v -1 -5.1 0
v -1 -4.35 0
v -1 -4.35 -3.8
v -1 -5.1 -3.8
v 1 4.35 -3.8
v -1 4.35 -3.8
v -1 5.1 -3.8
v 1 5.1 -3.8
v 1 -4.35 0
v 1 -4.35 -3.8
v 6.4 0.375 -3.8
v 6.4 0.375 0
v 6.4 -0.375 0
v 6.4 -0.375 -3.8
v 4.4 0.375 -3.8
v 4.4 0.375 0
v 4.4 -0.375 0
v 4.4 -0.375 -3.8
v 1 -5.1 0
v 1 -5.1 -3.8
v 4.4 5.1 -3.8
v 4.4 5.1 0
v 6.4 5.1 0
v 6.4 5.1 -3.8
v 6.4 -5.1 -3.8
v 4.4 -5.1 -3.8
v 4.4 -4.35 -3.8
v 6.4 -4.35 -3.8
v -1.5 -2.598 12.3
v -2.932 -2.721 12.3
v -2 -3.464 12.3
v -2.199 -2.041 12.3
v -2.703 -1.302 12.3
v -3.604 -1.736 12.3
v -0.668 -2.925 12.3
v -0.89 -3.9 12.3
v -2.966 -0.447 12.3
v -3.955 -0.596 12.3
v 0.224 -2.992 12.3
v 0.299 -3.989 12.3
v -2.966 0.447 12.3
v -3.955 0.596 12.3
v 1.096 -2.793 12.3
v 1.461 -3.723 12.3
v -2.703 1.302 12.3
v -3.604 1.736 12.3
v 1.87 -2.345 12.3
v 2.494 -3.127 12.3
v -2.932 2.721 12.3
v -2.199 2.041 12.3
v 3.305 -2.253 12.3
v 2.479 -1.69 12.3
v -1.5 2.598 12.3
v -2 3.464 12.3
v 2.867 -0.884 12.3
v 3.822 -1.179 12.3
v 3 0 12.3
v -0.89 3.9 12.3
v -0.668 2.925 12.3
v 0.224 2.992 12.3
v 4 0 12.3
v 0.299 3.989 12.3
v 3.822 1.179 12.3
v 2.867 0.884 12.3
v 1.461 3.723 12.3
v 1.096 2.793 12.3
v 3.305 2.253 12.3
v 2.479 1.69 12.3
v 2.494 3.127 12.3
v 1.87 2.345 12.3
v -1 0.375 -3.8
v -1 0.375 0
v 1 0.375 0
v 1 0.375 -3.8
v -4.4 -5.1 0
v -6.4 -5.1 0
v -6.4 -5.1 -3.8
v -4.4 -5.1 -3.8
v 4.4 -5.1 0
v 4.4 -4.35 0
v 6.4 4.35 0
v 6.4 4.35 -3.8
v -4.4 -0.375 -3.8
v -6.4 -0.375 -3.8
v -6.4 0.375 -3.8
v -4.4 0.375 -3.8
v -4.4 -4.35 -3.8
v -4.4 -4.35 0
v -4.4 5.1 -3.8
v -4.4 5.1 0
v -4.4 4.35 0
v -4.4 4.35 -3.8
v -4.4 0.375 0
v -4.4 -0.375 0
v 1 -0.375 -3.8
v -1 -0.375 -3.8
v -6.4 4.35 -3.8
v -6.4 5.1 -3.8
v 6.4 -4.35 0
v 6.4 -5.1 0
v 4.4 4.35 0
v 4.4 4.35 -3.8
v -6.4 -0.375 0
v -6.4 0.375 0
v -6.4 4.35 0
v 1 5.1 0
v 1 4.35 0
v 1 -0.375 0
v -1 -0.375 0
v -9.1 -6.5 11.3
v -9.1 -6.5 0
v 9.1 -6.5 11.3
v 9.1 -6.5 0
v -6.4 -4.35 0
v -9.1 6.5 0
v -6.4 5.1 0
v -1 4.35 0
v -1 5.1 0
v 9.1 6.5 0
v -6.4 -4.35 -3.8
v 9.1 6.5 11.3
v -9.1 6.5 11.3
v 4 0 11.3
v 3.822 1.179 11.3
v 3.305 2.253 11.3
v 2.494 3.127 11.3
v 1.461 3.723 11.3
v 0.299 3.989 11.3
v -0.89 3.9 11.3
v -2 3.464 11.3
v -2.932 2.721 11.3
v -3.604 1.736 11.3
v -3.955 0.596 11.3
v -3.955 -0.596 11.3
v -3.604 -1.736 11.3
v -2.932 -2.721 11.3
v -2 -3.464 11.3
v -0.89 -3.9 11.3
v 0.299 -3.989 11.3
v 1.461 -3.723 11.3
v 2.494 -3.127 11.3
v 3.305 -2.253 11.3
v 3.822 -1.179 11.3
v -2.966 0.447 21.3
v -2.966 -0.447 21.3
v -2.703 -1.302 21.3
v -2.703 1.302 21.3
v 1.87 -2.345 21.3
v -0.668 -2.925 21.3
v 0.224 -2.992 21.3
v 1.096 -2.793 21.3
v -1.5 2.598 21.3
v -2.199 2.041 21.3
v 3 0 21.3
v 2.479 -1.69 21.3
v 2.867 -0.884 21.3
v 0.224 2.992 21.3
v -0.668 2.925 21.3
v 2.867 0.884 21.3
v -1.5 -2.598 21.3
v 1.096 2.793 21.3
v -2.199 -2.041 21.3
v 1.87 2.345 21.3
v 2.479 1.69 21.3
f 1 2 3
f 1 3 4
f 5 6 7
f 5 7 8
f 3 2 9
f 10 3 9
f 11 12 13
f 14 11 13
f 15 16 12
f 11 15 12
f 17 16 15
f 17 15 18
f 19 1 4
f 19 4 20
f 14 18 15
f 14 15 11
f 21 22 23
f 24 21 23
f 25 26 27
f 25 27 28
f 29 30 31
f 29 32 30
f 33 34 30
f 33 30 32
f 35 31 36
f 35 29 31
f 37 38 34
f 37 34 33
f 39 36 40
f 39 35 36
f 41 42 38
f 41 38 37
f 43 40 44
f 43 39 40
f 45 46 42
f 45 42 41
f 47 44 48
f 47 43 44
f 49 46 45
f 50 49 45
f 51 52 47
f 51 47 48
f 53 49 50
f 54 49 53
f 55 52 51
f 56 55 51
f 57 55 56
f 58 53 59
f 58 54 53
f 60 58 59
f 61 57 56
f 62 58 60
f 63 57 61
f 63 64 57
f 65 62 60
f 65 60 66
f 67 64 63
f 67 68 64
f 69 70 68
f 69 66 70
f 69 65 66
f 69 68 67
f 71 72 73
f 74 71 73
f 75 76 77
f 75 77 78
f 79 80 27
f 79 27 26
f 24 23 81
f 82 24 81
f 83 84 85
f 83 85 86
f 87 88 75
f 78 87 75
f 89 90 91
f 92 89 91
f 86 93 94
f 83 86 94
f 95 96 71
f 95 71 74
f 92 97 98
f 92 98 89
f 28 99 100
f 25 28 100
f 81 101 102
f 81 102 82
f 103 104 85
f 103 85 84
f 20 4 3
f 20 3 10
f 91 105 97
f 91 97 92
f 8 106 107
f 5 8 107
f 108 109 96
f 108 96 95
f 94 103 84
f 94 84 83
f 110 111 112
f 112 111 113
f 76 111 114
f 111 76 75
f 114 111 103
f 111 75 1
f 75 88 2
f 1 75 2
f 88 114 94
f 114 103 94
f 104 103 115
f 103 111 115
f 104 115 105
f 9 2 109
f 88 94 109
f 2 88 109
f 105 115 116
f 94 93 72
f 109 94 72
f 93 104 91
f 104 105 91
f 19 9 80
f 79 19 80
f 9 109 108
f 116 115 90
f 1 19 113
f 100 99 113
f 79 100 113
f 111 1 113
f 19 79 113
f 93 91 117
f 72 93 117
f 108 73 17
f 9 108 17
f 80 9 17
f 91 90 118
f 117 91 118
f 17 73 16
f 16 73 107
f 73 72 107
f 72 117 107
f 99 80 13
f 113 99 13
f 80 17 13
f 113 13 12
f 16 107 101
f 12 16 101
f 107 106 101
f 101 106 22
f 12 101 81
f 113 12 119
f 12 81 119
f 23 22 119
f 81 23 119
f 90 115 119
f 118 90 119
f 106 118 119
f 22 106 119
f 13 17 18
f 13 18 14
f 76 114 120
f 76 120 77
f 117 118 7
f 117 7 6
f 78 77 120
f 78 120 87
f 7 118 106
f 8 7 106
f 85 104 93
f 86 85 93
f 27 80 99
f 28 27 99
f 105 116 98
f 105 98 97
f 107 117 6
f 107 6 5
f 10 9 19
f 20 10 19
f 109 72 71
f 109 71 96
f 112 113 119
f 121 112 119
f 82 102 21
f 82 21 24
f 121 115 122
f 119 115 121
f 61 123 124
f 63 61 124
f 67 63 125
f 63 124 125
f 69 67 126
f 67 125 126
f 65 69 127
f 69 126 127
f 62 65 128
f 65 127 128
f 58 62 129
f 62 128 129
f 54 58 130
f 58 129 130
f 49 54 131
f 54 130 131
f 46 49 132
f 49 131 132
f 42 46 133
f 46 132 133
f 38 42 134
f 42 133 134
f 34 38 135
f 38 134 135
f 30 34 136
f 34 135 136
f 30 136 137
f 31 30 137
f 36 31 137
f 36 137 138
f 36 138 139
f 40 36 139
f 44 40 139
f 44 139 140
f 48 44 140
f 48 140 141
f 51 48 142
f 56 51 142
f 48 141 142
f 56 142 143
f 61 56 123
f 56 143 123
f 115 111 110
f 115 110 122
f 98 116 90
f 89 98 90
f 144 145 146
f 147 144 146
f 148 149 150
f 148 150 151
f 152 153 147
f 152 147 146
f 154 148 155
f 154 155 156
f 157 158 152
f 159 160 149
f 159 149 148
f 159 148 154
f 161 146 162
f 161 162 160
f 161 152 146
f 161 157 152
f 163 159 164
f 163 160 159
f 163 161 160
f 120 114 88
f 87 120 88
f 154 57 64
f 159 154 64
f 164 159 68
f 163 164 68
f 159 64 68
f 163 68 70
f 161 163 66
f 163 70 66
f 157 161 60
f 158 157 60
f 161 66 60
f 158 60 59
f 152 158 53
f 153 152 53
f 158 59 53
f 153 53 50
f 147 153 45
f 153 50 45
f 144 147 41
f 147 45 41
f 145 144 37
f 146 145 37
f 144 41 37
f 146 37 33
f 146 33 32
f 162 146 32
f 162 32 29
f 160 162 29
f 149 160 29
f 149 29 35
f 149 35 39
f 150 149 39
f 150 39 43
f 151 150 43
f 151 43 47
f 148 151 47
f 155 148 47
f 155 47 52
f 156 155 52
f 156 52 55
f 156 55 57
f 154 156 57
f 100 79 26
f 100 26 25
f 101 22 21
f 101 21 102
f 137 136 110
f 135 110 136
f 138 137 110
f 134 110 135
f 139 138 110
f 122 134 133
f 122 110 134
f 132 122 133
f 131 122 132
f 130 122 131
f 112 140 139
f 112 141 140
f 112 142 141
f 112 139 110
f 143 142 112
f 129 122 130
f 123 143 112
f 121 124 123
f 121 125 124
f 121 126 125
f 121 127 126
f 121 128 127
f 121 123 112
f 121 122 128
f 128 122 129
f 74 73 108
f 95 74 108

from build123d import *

# Parameters (mm, degrees)
F0_W      = 18.2
F0_H      = 13
F1_DEPTH  = 11.3
F2_R      = 4
F2_R_2    = 3
F3_DEPTH  = 1
F3_FACE_R = 3
F4_DEPTH  = 10
F5_W      = 2
F5_H      = 0.75
F6_DEPTH  = 3.8


with BuildPart() as f1:
    # F0 (on Top) → F1 (new body)
    with BuildSketch(Plane.XY):
        Rectangle(F0_W, F0_H)
    extrude(amount=F1_DEPTH)

    # F2 (on face) → F3 (join)
    with BuildSketch(Plane.XY.offset(11.3)):
        Circle(F2_R)
        Circle(F2_R_2, mode=Mode.SUBTRACT)
    extrude(amount=F3_DEPTH)

    # F3_face (on face) → F4 (join)
    with BuildSketch(Plane.XY.offset(11.3)):
        Circle(F3_FACE_R)
    extrude(amount=F4_DEPTH)

    # F5 (on face) → F6 (join)
    with BuildSketch(Plane(origin=(0, 0, 0), x_dir=(1, 0, 0), z_dir=(0, 0, -1))):
        with Locations((-5.4, 4.725)):
            Rectangle(F5_W, F5_H)
        with Locations((0, 4.725)):
            Rectangle(F5_W, F5_H)
        with Locations((5.4, 4.725)):
            Rectangle(F5_W, F5_H)
        with Locations((5.4, 0)):
            Rectangle(F5_W, F5_H)
        Rectangle(F5_W, F5_H)
        with Locations((-5.4, 0)):
            Rectangle(F5_W, F5_H)
        with Locations((5.4, -4.725)):
            Rectangle(F5_W, F5_H)
        with Locations((0, -4.725)):
            Rectangle(F5_W, F5_H)
        with Locations((-5.4, -4.725)):
            Rectangle(F5_W, F5_H)
    extrude(amount=F6_DEPTH)


solid = f1.part
